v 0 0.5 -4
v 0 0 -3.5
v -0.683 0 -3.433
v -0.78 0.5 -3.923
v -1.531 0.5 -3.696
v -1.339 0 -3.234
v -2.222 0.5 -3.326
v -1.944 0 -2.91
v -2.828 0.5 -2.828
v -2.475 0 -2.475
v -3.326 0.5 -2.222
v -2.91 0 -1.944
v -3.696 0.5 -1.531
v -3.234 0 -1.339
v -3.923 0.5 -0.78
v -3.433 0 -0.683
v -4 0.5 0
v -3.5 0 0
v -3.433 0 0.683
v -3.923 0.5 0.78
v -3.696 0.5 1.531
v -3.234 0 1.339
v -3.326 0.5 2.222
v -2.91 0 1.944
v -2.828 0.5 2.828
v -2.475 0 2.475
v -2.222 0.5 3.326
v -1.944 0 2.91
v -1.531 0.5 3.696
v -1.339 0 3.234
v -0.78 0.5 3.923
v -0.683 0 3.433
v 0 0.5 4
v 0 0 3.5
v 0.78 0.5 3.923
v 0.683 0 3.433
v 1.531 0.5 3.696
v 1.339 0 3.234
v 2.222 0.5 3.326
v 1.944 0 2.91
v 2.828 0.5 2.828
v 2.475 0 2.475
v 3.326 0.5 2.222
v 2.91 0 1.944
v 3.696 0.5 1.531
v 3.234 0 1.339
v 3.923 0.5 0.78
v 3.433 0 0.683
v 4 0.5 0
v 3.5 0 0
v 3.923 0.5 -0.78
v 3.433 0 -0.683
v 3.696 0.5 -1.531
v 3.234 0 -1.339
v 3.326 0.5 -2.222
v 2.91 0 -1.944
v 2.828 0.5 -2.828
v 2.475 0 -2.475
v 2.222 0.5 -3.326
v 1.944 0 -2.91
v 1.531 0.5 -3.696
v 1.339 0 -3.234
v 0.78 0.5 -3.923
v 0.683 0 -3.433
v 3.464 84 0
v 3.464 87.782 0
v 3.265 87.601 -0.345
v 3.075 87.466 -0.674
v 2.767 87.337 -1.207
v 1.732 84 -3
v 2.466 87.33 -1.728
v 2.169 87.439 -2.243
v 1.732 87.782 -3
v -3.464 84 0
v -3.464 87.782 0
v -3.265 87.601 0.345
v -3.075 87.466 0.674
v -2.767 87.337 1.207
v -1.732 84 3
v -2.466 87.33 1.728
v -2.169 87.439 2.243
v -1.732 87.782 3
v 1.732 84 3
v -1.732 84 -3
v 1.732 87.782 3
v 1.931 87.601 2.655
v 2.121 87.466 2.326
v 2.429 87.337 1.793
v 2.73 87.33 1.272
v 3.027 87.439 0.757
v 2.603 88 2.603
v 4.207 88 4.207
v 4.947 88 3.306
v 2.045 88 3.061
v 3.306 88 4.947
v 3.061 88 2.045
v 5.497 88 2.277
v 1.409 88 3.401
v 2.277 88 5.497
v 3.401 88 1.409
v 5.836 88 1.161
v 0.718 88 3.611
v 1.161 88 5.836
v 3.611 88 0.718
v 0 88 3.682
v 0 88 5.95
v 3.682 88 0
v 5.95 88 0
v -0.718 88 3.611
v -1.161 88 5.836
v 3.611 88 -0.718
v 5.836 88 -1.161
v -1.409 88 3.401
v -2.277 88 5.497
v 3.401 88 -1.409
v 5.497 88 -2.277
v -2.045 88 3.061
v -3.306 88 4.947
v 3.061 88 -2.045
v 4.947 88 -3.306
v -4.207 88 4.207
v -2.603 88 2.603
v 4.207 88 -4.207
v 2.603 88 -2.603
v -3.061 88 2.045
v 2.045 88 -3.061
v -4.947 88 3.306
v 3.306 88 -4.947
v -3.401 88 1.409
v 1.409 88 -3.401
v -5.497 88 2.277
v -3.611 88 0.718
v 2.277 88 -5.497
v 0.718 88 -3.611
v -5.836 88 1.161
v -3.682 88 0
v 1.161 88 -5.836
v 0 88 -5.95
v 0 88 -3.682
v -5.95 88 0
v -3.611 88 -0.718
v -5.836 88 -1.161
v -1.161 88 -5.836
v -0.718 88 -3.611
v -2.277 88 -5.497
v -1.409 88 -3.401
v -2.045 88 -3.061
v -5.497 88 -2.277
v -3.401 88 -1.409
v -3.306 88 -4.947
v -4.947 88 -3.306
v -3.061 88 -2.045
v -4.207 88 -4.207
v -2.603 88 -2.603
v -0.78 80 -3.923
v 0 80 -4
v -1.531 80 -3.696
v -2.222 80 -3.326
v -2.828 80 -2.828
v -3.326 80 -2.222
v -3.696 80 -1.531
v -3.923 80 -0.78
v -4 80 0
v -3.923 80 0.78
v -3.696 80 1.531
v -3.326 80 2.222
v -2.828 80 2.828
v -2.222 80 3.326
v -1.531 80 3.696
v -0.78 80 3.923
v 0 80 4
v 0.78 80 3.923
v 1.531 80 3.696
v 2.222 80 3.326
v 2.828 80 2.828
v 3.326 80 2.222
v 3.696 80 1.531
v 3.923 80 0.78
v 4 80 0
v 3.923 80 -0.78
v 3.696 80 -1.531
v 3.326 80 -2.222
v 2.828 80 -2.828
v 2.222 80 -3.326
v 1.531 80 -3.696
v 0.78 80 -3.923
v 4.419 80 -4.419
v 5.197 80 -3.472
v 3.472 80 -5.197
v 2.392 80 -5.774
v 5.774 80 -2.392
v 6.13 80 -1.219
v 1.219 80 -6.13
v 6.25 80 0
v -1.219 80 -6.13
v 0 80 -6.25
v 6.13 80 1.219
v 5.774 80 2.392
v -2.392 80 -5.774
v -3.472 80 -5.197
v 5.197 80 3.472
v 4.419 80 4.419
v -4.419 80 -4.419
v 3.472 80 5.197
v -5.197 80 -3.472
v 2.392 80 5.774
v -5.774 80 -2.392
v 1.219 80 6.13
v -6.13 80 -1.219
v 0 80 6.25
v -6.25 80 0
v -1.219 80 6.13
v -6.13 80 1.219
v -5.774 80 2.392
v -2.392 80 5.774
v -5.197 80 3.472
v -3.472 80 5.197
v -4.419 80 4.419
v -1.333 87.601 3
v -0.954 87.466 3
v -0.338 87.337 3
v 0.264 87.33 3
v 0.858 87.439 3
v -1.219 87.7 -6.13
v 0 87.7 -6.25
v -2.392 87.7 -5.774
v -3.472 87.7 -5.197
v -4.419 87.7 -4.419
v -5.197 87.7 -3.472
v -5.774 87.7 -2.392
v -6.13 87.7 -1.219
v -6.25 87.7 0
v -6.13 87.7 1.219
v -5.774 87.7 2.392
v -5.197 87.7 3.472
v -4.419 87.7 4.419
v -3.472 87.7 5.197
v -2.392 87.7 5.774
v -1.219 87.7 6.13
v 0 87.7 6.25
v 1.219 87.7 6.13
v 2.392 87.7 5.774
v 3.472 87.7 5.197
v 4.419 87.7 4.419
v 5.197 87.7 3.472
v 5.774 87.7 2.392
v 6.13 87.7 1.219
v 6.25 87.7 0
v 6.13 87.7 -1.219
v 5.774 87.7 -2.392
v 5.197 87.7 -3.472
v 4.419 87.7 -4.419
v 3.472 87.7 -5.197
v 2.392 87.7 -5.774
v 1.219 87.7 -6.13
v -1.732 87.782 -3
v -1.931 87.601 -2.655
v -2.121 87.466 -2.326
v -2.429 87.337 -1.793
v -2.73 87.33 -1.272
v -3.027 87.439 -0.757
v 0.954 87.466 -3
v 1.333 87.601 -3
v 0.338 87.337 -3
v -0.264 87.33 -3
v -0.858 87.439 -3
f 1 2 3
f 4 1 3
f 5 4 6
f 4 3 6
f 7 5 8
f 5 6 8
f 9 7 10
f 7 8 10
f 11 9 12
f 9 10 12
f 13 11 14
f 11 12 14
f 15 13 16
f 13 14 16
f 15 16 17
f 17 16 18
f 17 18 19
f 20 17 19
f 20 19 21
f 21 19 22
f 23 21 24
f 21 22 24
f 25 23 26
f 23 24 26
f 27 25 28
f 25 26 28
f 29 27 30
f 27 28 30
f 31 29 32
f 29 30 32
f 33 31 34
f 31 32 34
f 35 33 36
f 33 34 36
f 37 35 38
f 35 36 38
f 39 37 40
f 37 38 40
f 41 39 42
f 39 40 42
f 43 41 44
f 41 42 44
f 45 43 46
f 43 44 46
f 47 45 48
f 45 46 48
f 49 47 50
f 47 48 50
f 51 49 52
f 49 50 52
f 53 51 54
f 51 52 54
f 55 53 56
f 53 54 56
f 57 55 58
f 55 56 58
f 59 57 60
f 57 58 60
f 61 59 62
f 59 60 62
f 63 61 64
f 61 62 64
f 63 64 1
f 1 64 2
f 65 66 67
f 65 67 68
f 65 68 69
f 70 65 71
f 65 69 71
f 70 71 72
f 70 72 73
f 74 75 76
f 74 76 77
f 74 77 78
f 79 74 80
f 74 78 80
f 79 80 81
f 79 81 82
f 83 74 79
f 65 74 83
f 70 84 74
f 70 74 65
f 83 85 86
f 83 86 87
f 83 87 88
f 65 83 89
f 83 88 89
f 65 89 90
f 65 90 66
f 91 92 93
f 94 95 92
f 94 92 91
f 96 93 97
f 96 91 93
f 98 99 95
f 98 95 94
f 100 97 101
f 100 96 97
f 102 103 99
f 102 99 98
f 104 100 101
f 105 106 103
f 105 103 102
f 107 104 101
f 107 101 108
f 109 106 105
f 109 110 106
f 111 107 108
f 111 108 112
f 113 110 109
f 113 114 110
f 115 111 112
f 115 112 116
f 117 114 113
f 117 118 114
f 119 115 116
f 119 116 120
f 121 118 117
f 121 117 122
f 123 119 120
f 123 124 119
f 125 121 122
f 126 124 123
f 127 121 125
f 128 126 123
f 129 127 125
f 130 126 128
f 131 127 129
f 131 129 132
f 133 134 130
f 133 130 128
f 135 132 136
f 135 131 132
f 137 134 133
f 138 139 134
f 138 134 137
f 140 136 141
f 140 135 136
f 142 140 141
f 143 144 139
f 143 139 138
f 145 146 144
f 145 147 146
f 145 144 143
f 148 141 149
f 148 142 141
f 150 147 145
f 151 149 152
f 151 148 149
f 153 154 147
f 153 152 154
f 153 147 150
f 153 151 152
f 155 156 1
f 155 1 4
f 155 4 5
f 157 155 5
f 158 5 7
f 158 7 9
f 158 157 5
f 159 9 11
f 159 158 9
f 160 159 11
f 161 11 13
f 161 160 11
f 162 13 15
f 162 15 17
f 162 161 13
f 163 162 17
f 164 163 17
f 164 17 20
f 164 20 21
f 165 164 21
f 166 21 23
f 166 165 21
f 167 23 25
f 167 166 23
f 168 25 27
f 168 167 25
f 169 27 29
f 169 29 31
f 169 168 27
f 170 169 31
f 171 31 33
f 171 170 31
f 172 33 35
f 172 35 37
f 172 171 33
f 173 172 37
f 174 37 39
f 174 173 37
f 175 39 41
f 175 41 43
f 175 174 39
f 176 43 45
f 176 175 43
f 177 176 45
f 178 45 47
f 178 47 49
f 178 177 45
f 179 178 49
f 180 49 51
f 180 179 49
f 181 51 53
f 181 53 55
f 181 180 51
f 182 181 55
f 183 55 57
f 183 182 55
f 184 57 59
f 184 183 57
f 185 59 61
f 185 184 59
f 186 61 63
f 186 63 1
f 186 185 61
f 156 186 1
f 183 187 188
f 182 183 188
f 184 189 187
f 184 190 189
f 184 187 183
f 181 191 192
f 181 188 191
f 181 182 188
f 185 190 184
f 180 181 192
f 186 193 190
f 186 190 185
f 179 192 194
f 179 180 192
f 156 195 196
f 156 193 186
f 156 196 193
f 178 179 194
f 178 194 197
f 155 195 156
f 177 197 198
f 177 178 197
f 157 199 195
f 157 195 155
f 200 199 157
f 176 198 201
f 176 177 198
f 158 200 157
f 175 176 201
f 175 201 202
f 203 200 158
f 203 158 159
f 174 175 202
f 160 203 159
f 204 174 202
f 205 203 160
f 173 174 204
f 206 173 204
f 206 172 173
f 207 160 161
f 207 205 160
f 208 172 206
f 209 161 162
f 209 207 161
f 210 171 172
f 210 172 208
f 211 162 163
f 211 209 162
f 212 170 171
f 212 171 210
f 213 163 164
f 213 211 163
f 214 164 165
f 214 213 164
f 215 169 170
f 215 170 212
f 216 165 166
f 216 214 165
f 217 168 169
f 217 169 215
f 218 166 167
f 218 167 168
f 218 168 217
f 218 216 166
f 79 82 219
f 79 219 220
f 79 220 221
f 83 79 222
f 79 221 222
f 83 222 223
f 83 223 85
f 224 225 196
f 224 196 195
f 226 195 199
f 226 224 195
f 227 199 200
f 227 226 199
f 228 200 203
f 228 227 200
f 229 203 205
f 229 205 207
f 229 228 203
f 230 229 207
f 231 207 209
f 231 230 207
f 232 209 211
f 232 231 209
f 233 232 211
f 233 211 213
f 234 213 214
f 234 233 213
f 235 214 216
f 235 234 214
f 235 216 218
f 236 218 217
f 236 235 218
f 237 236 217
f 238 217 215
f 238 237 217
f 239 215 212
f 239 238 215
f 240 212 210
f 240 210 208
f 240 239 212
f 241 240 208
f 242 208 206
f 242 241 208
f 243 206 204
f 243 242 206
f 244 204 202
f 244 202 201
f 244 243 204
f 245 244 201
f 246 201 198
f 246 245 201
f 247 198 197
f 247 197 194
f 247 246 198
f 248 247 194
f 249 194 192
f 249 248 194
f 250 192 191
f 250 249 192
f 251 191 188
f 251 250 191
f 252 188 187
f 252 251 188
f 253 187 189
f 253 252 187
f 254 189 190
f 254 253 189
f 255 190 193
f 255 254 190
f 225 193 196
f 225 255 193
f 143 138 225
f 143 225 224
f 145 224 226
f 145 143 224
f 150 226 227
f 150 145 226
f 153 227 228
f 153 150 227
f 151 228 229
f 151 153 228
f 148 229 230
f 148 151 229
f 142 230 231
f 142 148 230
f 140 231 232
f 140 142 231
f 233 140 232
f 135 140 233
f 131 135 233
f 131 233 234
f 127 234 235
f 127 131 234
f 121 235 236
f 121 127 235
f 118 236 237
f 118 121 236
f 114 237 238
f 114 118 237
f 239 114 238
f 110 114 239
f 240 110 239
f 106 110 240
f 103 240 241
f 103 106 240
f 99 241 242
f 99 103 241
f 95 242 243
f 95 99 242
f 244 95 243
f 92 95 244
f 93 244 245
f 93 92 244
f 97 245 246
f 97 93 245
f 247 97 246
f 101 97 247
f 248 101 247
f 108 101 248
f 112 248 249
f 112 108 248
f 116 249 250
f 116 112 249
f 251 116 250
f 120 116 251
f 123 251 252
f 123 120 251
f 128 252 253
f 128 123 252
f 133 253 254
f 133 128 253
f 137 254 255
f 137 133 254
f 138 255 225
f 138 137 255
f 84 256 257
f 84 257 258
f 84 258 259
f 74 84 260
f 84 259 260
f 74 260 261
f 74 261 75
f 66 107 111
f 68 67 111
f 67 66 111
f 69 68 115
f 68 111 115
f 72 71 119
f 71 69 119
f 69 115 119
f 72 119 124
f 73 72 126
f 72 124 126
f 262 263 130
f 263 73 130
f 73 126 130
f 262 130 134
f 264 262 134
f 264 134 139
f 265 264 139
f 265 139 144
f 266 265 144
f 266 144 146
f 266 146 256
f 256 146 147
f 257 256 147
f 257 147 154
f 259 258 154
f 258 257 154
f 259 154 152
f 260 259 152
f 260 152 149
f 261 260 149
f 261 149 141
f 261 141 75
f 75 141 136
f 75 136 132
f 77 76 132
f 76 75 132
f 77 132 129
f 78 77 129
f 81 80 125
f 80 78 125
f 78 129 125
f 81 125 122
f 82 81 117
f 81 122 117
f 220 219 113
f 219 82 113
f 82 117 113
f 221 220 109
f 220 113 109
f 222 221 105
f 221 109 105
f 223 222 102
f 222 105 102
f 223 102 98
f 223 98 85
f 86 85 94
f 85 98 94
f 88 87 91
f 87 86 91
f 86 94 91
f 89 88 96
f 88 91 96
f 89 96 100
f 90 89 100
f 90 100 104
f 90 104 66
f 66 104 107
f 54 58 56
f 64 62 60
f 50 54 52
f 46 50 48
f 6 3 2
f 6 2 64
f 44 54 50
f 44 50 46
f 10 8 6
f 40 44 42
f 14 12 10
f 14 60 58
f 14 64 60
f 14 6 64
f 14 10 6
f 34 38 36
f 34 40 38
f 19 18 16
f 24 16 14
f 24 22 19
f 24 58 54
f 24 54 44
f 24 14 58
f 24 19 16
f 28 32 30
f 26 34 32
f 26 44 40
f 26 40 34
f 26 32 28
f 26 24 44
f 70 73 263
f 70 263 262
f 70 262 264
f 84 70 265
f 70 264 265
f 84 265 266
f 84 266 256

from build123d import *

# Parameters (mm, degrees)
WYCI_GNI_CIE1_DEPTH        = 4
SFAZOWANIE1_SIZE           = 0.3
SZKIC3_R                   = 3.68172134
WYTNIJ_WYCI_GNI_CIE1_DEPTH = 2
WYTNIJ_WYCI_GNI_CIE1_DRAFT = -45
SFAZOWANIE2_SIZE           = 0.5


with BuildPart() as part:
    # Szkic1 → Obrót1 (revolve)
    with BuildSketch(Plane.XY, mode=Mode.PRIVATE) as obr_t1_sk:
        Polygon((0, 0), (-4, 0), (-4, 80), (-6.25, 80), (-6.25, 88), (0, 88), align=None)
    revolve(obr_t1_sk.sketch.rotate(Axis((0, 0, 0), (0, 1, 0)), 270), axis=Axis((0, 0, 0), (0, 1, 0)))

    # Szkic2 → Wyciągnięcie1 (cut)
    with BuildSketch(Plane(origin=(0, 88, 0), x_dir=(1, 0, 0), z_dir=(0, 1, 0))):
        Polygon((3.464101615, 0), (1.732050808, 3), (-1.732050808, 3), (-3.464101615, 0), (-1.732050808, -3), (1.732050808, -3), align=None)
    extrude(amount=-WYCI_GNI_CIE1_DEPTH, mode=Mode.SUBTRACT)

    # Sfazowanie1
    sfazowanie1_edges = [part.edges().sort_by_distance(p)[0] for p in [
        (0, 88, 6.25),
    ]]
    chamfer(sfazowanie1_edges, length=SFAZOWANIE1_SIZE)


with BuildPart() as wytnij_wyci_gni_cie1_tool:
    # Szkic3 → Wytnij-wyciągnięcie1 (with draft: the straight prism first)
    with BuildSketch(Plane(origin=(0, 88, 0), x_dir=(1, 0, 0), z_dir=(0, 1, 0))):
        Circle(SZKIC3_R)
    extrude(amount=-WYTNIJ_WYCI_GNI_CIE1_DEPTH)
    # Wytnij-wyciągnięcie1: the draft: its side faces are tilted about the plane it starts from
    wytnij_wyci_gni_cie1_sides = [wytnij_wyci_gni_cie1_tool.faces().sort_by_distance(p)[0] for p in [
        (-3.68172134, 87, 0),
    ]]
    draft(wytnij_wyci_gni_cie1_sides, Plane(origin=(0, 88, 0), x_dir=(1, 0, 0), z_dir=(0, 1, 0)), WYTNIJ_WYCI_GNI_CIE1_DRAFT)


with BuildPart() as part_1:
    add(part.part)

    # Wytnij-wyciągnięcie1: cut by wytnij_wyci_gni_cie1_tool
    add(wytnij_wyci_gni_cie1_tool.part, mode=Mode.SUBTRACT)

    # Sfazowanie2
    sfazowanie2_edges = [part_1.edges().sort_by_distance(p)[0] for p in [
        (0, 0, 4),
    ]]
    chamfer(sfazowanie2_edges, length=SFAZOWANIE2_SIZE)


solid = part_1.part
